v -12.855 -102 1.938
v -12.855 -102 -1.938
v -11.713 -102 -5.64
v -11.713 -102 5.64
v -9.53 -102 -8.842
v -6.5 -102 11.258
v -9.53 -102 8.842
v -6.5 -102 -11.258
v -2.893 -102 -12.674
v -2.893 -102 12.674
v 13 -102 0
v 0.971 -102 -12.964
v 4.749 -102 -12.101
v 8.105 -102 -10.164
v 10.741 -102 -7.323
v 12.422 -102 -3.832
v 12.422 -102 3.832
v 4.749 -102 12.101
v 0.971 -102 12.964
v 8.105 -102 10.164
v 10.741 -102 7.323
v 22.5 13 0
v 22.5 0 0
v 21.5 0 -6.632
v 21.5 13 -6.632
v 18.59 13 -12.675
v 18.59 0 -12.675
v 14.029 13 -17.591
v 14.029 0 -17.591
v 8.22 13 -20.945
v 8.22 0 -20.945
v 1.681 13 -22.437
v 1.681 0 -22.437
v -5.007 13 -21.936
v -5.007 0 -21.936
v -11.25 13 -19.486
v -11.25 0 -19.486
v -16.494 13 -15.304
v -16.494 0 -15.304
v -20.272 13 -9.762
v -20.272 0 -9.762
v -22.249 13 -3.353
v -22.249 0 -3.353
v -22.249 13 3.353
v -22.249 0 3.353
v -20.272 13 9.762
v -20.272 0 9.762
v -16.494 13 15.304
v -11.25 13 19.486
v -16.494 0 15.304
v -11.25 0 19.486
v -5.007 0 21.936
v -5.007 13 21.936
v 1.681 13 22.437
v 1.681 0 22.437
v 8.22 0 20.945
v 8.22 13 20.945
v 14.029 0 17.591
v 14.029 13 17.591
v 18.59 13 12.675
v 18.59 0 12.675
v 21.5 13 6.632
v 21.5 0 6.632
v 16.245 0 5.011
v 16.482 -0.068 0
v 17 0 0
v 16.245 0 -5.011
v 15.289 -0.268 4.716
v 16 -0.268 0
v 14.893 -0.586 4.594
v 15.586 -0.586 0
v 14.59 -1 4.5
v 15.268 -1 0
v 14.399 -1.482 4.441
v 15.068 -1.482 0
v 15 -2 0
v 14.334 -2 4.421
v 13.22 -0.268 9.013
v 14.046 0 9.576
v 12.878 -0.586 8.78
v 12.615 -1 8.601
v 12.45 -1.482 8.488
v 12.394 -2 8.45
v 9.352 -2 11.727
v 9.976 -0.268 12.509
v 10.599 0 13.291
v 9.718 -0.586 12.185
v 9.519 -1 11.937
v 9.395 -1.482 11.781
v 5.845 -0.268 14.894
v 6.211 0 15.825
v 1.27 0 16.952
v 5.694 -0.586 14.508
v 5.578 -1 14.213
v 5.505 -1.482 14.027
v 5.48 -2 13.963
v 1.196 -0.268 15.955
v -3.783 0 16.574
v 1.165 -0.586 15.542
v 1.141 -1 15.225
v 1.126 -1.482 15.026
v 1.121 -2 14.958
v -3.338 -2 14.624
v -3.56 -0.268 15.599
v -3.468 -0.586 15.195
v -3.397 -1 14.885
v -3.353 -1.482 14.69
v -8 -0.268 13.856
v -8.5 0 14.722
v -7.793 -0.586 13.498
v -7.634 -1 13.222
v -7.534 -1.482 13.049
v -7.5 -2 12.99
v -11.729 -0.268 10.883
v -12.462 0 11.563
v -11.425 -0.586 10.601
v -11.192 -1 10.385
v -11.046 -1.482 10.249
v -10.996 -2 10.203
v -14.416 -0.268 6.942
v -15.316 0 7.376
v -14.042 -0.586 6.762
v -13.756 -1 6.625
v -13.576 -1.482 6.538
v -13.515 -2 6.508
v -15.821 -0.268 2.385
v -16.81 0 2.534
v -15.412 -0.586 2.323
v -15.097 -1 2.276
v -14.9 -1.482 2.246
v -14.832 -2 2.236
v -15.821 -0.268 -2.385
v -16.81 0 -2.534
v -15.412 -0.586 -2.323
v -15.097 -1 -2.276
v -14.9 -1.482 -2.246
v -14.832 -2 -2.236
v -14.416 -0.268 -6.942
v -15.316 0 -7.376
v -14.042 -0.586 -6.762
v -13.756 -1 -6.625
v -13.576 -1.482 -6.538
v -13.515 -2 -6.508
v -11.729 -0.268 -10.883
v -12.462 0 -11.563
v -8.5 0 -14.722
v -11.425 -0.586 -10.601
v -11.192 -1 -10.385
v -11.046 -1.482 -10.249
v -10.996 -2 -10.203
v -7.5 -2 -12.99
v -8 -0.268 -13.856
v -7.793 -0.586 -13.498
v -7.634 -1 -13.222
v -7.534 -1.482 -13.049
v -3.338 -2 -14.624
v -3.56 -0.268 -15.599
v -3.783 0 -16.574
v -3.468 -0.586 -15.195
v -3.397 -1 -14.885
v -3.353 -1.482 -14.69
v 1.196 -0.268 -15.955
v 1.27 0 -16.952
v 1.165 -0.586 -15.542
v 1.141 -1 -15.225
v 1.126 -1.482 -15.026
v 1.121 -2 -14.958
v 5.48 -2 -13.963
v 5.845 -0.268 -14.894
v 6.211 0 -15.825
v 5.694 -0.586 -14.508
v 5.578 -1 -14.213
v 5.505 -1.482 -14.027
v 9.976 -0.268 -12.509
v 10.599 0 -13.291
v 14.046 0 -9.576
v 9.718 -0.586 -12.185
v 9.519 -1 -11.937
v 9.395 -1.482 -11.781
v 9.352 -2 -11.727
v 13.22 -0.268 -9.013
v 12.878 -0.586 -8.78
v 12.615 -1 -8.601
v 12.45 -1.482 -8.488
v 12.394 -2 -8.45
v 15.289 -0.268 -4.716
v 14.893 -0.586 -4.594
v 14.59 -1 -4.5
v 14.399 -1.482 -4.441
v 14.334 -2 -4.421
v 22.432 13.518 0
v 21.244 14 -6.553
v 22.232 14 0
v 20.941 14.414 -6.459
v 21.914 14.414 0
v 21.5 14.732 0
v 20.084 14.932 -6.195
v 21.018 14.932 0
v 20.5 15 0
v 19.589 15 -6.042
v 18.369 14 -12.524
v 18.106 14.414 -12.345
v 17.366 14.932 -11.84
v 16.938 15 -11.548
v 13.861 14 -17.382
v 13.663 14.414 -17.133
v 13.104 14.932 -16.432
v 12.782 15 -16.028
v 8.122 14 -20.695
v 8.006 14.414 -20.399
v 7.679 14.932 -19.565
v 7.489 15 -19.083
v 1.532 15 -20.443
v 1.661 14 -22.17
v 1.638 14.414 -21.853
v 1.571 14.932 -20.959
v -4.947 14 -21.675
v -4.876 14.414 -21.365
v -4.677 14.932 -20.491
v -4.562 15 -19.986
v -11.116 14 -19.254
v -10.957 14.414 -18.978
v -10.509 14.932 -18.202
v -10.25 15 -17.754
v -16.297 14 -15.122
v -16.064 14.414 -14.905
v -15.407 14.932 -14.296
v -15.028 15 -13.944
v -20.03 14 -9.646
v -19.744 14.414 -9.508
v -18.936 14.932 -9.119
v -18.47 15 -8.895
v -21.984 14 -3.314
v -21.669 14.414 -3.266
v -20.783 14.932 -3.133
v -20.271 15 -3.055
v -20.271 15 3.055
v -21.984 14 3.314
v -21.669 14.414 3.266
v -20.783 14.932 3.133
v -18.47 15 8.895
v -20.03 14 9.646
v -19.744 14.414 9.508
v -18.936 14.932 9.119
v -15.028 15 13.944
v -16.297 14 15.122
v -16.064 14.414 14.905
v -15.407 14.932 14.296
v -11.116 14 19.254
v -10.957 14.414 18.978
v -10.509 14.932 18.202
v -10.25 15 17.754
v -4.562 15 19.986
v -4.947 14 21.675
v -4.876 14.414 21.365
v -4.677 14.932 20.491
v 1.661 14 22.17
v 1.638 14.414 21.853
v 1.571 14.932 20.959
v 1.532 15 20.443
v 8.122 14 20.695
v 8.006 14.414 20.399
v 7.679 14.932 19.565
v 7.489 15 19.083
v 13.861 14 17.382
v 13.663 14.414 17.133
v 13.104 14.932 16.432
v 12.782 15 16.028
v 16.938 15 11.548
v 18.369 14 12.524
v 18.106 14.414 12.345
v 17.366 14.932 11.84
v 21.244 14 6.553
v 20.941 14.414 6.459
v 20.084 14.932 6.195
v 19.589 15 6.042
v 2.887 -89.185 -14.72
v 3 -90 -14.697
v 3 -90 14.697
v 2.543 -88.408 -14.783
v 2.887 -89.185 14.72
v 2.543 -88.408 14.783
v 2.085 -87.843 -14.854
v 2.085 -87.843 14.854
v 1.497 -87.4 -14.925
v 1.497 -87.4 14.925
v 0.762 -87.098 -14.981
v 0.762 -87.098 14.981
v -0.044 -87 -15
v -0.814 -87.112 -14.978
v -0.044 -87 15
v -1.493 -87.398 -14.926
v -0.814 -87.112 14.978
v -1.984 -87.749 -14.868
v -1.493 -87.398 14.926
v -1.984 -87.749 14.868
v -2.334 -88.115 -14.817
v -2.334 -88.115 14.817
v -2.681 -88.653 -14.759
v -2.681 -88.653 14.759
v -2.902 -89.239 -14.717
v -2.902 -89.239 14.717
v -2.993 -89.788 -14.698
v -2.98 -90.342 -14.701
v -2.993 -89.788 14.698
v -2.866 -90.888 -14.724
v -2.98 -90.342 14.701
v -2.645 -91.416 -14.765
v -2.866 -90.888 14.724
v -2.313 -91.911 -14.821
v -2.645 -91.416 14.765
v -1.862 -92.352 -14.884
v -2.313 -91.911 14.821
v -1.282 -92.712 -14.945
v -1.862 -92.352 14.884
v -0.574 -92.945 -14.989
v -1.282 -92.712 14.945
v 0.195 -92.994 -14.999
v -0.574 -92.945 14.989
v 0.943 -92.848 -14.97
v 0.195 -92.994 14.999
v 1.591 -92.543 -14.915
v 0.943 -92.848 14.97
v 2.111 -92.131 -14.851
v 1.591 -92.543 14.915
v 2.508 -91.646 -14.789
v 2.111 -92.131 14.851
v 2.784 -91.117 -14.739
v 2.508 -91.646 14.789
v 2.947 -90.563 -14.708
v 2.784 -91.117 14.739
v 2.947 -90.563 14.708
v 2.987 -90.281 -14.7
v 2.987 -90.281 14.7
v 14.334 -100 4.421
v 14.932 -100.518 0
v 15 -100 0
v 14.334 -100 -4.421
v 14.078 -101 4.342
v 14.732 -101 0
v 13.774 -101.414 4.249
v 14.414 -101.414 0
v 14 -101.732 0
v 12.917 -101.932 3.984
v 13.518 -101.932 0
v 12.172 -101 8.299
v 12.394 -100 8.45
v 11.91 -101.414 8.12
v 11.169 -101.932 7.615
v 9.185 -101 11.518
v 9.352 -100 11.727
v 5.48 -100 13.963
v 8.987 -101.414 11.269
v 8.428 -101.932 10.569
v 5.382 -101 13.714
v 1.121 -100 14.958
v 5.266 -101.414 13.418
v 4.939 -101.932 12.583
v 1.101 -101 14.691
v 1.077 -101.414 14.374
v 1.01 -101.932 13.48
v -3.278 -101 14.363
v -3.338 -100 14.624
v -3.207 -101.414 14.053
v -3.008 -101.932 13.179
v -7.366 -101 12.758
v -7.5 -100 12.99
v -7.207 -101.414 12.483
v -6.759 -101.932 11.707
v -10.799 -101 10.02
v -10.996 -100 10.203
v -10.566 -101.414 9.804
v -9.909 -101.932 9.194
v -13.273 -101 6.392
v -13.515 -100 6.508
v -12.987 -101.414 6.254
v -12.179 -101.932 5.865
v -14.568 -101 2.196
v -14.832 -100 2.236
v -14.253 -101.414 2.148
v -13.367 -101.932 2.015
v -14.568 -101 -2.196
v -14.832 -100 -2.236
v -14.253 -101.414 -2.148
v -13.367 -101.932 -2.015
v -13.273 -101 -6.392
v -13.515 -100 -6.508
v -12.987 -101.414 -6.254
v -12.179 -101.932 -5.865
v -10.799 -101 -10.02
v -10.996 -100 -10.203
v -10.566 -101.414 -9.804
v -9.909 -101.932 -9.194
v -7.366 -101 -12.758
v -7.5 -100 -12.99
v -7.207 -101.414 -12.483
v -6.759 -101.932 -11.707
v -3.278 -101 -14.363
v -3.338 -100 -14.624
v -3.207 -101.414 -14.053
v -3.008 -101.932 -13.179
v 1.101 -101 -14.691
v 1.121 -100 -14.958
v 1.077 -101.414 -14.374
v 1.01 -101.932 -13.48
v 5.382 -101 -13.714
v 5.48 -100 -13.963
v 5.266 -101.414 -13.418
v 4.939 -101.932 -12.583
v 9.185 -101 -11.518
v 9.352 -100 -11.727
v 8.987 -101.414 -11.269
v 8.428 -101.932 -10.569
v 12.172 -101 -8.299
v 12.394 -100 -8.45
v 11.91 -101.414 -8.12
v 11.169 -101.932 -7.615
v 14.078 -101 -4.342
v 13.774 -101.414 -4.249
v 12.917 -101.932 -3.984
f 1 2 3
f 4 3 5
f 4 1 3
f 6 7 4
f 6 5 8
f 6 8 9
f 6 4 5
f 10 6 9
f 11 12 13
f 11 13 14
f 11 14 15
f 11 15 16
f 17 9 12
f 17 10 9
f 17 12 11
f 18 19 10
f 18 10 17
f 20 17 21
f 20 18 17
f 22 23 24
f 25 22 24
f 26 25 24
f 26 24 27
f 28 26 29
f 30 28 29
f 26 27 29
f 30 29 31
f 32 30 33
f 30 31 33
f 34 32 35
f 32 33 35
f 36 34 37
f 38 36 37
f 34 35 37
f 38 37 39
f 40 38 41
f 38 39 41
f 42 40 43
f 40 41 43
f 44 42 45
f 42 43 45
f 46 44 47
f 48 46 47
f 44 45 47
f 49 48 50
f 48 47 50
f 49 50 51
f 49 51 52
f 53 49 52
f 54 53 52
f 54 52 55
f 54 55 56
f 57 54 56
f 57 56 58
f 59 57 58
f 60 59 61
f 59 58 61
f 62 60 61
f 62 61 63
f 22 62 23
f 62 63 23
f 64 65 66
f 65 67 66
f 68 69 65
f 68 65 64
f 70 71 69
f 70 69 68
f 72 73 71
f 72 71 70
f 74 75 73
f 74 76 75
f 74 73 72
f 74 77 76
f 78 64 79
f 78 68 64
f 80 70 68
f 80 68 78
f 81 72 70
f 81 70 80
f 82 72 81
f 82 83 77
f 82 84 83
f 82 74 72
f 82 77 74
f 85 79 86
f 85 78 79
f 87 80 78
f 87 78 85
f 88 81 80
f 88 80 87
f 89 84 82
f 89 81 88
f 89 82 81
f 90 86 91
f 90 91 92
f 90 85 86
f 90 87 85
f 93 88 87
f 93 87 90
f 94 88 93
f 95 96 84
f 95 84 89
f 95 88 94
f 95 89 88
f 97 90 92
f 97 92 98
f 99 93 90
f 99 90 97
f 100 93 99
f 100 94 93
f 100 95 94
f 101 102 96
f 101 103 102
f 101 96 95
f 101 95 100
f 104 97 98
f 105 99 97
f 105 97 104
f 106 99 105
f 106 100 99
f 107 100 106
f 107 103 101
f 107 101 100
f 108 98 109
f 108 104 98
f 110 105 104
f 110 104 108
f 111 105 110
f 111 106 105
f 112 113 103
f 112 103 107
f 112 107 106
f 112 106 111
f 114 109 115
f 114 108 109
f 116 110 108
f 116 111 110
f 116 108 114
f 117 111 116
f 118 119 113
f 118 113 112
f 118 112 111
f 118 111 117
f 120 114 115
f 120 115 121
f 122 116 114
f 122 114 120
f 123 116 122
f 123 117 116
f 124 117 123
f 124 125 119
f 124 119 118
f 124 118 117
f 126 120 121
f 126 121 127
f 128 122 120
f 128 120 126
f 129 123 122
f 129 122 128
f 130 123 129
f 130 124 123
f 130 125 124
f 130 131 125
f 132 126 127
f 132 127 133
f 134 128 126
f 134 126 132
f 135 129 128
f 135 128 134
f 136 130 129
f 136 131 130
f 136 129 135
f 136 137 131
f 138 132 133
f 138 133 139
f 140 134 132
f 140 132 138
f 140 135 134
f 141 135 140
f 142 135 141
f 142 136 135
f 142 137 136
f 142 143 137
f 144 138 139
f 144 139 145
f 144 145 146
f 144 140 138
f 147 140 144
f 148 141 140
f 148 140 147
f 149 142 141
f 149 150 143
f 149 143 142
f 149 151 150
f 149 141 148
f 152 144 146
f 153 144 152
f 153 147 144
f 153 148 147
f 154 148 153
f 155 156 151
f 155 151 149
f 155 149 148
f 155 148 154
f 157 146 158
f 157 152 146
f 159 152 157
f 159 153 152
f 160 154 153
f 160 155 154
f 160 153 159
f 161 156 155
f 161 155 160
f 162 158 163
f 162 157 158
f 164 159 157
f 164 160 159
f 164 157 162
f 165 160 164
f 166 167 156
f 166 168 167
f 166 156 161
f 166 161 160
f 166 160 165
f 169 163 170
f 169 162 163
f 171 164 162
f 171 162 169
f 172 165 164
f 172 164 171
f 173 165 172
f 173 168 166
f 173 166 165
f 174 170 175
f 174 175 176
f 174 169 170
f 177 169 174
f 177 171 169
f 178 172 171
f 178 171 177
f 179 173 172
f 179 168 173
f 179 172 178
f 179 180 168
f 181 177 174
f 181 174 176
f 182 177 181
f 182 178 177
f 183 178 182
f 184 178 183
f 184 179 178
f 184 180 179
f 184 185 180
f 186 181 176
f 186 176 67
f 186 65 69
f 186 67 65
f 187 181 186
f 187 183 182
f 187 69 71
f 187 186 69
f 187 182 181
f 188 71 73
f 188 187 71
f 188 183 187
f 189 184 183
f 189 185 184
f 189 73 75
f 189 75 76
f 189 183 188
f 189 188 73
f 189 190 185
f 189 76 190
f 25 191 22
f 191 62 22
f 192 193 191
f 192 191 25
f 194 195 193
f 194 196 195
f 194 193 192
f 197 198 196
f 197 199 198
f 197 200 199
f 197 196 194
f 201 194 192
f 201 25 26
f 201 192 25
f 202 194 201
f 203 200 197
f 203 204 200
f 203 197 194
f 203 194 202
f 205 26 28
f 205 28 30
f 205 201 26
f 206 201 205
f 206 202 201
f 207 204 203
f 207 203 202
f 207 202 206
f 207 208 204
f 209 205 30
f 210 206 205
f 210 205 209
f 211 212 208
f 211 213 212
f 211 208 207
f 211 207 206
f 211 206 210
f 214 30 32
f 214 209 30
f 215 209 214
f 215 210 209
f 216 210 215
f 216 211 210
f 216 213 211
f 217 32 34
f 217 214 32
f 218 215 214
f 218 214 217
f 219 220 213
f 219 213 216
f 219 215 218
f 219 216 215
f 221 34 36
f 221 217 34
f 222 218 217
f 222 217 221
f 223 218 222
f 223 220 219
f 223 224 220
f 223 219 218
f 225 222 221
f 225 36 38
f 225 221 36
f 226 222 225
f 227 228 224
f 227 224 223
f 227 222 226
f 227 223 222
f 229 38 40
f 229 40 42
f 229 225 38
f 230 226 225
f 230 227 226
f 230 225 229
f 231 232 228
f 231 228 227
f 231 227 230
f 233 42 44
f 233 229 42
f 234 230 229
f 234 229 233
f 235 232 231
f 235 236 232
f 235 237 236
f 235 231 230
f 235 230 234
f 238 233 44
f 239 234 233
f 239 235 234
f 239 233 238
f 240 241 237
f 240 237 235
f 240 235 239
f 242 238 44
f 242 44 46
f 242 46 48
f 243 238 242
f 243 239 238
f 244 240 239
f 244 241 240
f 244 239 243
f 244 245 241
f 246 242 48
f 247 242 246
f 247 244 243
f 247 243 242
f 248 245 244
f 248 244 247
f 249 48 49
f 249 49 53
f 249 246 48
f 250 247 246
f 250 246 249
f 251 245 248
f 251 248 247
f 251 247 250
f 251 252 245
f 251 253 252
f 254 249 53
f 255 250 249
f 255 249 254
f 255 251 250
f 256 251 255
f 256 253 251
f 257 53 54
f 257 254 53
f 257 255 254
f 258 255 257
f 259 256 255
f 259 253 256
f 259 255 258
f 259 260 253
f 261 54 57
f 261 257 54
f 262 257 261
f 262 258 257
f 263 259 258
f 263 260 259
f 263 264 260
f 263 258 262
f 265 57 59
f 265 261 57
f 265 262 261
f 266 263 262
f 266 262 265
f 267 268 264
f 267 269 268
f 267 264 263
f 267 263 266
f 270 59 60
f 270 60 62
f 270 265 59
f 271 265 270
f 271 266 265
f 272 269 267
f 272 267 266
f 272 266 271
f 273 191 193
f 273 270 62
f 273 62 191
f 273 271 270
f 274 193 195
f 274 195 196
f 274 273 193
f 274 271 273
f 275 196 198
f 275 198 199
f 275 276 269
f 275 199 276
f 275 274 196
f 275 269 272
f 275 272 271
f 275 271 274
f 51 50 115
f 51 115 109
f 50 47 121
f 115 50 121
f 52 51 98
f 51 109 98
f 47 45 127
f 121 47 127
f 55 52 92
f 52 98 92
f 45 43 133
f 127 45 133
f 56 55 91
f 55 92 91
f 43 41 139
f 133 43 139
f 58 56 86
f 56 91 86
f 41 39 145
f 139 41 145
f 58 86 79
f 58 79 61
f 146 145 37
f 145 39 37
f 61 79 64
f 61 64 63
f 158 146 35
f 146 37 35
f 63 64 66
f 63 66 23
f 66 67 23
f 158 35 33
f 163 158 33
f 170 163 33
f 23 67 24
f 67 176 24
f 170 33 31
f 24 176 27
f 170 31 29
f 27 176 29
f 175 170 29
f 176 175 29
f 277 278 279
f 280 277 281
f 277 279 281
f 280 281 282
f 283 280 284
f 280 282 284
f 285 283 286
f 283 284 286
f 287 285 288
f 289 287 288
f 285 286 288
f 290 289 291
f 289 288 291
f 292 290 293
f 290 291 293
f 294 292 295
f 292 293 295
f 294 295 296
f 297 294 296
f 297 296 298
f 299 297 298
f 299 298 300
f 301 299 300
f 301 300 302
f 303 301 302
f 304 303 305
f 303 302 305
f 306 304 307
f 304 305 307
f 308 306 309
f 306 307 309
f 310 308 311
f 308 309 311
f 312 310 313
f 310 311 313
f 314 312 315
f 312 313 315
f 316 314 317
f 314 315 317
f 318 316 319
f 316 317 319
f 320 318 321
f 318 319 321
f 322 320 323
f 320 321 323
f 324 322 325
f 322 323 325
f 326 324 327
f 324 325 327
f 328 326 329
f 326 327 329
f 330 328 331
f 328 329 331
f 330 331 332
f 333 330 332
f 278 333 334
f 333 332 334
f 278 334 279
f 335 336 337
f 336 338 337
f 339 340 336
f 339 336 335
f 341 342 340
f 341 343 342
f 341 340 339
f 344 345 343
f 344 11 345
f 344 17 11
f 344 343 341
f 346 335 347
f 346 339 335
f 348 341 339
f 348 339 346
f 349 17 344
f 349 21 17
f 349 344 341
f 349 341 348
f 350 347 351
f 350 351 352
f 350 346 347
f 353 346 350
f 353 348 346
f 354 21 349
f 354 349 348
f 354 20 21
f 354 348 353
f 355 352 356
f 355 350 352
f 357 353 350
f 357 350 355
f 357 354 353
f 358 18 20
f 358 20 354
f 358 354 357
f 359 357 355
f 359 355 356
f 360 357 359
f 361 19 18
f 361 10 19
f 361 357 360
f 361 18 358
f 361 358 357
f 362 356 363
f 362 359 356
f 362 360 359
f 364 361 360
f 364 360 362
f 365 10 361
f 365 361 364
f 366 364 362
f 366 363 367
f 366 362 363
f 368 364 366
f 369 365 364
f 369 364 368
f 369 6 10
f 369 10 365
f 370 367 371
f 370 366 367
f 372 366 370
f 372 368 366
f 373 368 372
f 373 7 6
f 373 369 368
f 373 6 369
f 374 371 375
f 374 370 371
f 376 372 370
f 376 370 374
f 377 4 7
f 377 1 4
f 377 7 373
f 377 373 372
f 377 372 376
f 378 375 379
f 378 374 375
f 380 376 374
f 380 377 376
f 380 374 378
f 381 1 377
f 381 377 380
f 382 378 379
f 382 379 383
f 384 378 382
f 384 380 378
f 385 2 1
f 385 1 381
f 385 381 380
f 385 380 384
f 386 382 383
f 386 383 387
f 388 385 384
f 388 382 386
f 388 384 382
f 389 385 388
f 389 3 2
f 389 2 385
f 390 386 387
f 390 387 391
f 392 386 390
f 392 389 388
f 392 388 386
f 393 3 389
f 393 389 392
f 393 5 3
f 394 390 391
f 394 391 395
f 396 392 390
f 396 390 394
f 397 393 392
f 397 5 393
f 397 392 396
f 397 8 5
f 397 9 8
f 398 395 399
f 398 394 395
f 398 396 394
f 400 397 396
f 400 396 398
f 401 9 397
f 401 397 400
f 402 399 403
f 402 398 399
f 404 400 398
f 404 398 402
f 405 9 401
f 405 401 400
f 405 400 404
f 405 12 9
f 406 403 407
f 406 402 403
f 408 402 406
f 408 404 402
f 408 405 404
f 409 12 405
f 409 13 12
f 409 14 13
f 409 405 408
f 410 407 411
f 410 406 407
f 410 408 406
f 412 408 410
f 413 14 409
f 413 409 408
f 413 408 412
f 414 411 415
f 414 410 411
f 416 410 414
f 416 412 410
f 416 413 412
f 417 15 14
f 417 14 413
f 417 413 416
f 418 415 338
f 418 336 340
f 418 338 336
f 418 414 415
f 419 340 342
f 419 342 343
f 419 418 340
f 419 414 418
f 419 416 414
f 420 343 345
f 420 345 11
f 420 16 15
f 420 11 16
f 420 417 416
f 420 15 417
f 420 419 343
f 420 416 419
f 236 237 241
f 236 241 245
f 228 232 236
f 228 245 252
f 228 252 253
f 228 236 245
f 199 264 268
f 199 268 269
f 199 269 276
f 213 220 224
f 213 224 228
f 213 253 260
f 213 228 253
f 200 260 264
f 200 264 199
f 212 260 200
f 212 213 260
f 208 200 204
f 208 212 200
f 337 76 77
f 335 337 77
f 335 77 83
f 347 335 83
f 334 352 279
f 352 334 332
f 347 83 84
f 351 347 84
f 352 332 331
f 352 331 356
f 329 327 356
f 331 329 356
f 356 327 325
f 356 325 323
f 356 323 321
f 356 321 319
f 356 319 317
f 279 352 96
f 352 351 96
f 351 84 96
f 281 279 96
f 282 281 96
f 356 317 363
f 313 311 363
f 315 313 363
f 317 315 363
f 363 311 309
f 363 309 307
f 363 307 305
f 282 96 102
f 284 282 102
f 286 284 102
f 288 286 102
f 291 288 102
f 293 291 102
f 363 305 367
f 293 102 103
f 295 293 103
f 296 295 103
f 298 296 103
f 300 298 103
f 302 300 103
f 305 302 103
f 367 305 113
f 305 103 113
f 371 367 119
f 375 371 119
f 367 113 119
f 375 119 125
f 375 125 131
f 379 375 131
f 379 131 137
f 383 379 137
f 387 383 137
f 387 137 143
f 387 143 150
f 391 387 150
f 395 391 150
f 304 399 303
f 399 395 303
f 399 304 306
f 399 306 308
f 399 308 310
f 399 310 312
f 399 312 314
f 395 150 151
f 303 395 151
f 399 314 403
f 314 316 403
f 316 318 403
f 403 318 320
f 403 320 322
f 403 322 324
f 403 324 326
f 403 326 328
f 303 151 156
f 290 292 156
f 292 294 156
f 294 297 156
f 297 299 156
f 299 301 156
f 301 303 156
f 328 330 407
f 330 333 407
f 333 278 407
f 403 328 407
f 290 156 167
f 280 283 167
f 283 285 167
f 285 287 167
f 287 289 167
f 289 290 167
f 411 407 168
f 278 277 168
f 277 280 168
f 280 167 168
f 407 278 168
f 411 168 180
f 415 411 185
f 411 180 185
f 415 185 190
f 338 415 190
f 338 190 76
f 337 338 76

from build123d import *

# Parameters (mm, degrees)
SKETCH1_R               = 22.5
BOSS_EXTRUDE1_DEPTH     = 15
SKETCH2_R               = 15
BOSS_EXTRUDE2_DEPTH     = 102
FILLET1_R               = 2
SKETCH3_R               = 3
CUT_EXTRUDE1_DEPTH      = 23.5
CUT_EXTRUDE1_DEPTH_BACK = 23.5


with BuildPart() as part:
    # Sketch1 → Boss-Extrude1 (new body)
    with BuildSketch(Plane(origin=(0, 0, 0), x_dir=(1, 0, 0), z_dir=(0, 1, 0))):
        Circle(SKETCH1_R)
    extrude(amount=BOSS_EXTRUDE1_DEPTH)

    # Sketch2 → Boss-Extrude2 (add)
    with BuildSketch(Plane.XZ):
        Circle(SKETCH2_R)
    extrude(amount=BOSS_EXTRUDE2_DEPTH)

    # Fillet1
    fillet1_edges = [part.edges().sort_by_distance(p)[0] for p in [
        (-22.5, 15, 0),
        (-15, 0, 0),
        (-15, -102, 0),
    ]]
    fillet(fillet1_edges, radius=FILLET1_R)

    # Sketch3 → Cut-Extrude1 (cut, two sides)
    with BuildSketch(Plane.XY) as cut_extrude1_sk:
        with Locations((0, -90)):
            Circle(SKETCH3_R)
    extrude(amount=CUT_EXTRUDE1_DEPTH, mode=Mode.SUBTRACT)
    extrude(cut_extrude1_sk.sketch, amount=-CUT_EXTRUDE1_DEPTH_BACK, mode=Mode.SUBTRACT)


solid = part.part
